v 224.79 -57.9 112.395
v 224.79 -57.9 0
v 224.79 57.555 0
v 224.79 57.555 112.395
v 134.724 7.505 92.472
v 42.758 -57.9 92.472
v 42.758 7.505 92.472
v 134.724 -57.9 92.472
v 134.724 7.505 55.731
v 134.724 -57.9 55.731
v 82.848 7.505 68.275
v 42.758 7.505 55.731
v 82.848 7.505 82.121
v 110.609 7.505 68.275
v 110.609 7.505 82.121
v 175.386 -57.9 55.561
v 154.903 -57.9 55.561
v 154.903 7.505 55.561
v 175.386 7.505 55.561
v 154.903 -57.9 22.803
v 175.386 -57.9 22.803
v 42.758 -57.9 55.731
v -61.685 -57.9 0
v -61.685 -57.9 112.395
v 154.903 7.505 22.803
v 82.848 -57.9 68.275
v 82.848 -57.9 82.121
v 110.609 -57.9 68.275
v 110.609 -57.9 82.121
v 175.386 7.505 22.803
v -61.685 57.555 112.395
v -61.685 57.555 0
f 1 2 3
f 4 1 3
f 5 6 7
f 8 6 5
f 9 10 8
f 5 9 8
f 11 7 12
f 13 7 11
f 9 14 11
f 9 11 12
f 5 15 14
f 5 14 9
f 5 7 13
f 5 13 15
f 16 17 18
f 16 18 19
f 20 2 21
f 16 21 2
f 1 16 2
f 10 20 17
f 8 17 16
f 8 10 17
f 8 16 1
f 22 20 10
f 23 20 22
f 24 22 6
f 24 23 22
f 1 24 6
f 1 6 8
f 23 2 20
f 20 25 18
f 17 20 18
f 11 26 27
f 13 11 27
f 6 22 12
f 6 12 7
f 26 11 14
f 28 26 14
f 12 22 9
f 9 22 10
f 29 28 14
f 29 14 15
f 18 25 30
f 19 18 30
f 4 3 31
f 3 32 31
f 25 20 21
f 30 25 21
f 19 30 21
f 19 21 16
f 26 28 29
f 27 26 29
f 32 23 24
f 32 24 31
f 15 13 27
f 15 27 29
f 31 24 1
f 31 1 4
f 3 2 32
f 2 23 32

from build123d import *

# Parameters (mm, degrees)
F0_W     = 61.6851523519
F0_H     = 115.4553033412
F1_DEPTH = 112.395
F2_DEPTH = 224.79
F3_W     = 91.9657982886
F3_H     = 36.7413535714
F3_W_2   = 27.7609527111
F3_H_2   = 13.8463228941
F3_W_3   = 20.4830765724
F3_H_3   = 32.7579472214
F4_DEPTH = 65.405


with BuildPart() as f1:
    # F0 (on Top) → F1 (new body)
    with BuildSketch(Plane.XY):
        with Locations((-30.8425761759, -0.1723002642)):
            Rectangle(F0_W, F0_H)
    extrude(amount=F1_DEPTH)

    # F2 (add): a face of the model
    f2_faces = [f1.faces().sort_by_distance(p)[0] for p in [
        (0, -0.1723002642, 56.1975),
    ]]
    extrude(f2_faces, amount=F2_DEPTH)

    # F3 (on face) → F4 (cut)
    with BuildSketch(Plane.XZ.offset(57.8999519348)):
        with Locations((88.7409579009, 74.1017498076)):
            Rectangle(F3_W, F3_H)
        with Locations((96.7281907797, 75.1979798079)):
            Rectangle(F3_W_2, F3_H_2, mode=Mode.SUBTRACT)
        with Locations((165.1449352503, 39.1824124381)):
            Rectangle(F3_W_3, F3_H_3)
    extrude(amount=-F4_DEPTH, mode=Mode.SUBTRACT)


solid = f1.part
